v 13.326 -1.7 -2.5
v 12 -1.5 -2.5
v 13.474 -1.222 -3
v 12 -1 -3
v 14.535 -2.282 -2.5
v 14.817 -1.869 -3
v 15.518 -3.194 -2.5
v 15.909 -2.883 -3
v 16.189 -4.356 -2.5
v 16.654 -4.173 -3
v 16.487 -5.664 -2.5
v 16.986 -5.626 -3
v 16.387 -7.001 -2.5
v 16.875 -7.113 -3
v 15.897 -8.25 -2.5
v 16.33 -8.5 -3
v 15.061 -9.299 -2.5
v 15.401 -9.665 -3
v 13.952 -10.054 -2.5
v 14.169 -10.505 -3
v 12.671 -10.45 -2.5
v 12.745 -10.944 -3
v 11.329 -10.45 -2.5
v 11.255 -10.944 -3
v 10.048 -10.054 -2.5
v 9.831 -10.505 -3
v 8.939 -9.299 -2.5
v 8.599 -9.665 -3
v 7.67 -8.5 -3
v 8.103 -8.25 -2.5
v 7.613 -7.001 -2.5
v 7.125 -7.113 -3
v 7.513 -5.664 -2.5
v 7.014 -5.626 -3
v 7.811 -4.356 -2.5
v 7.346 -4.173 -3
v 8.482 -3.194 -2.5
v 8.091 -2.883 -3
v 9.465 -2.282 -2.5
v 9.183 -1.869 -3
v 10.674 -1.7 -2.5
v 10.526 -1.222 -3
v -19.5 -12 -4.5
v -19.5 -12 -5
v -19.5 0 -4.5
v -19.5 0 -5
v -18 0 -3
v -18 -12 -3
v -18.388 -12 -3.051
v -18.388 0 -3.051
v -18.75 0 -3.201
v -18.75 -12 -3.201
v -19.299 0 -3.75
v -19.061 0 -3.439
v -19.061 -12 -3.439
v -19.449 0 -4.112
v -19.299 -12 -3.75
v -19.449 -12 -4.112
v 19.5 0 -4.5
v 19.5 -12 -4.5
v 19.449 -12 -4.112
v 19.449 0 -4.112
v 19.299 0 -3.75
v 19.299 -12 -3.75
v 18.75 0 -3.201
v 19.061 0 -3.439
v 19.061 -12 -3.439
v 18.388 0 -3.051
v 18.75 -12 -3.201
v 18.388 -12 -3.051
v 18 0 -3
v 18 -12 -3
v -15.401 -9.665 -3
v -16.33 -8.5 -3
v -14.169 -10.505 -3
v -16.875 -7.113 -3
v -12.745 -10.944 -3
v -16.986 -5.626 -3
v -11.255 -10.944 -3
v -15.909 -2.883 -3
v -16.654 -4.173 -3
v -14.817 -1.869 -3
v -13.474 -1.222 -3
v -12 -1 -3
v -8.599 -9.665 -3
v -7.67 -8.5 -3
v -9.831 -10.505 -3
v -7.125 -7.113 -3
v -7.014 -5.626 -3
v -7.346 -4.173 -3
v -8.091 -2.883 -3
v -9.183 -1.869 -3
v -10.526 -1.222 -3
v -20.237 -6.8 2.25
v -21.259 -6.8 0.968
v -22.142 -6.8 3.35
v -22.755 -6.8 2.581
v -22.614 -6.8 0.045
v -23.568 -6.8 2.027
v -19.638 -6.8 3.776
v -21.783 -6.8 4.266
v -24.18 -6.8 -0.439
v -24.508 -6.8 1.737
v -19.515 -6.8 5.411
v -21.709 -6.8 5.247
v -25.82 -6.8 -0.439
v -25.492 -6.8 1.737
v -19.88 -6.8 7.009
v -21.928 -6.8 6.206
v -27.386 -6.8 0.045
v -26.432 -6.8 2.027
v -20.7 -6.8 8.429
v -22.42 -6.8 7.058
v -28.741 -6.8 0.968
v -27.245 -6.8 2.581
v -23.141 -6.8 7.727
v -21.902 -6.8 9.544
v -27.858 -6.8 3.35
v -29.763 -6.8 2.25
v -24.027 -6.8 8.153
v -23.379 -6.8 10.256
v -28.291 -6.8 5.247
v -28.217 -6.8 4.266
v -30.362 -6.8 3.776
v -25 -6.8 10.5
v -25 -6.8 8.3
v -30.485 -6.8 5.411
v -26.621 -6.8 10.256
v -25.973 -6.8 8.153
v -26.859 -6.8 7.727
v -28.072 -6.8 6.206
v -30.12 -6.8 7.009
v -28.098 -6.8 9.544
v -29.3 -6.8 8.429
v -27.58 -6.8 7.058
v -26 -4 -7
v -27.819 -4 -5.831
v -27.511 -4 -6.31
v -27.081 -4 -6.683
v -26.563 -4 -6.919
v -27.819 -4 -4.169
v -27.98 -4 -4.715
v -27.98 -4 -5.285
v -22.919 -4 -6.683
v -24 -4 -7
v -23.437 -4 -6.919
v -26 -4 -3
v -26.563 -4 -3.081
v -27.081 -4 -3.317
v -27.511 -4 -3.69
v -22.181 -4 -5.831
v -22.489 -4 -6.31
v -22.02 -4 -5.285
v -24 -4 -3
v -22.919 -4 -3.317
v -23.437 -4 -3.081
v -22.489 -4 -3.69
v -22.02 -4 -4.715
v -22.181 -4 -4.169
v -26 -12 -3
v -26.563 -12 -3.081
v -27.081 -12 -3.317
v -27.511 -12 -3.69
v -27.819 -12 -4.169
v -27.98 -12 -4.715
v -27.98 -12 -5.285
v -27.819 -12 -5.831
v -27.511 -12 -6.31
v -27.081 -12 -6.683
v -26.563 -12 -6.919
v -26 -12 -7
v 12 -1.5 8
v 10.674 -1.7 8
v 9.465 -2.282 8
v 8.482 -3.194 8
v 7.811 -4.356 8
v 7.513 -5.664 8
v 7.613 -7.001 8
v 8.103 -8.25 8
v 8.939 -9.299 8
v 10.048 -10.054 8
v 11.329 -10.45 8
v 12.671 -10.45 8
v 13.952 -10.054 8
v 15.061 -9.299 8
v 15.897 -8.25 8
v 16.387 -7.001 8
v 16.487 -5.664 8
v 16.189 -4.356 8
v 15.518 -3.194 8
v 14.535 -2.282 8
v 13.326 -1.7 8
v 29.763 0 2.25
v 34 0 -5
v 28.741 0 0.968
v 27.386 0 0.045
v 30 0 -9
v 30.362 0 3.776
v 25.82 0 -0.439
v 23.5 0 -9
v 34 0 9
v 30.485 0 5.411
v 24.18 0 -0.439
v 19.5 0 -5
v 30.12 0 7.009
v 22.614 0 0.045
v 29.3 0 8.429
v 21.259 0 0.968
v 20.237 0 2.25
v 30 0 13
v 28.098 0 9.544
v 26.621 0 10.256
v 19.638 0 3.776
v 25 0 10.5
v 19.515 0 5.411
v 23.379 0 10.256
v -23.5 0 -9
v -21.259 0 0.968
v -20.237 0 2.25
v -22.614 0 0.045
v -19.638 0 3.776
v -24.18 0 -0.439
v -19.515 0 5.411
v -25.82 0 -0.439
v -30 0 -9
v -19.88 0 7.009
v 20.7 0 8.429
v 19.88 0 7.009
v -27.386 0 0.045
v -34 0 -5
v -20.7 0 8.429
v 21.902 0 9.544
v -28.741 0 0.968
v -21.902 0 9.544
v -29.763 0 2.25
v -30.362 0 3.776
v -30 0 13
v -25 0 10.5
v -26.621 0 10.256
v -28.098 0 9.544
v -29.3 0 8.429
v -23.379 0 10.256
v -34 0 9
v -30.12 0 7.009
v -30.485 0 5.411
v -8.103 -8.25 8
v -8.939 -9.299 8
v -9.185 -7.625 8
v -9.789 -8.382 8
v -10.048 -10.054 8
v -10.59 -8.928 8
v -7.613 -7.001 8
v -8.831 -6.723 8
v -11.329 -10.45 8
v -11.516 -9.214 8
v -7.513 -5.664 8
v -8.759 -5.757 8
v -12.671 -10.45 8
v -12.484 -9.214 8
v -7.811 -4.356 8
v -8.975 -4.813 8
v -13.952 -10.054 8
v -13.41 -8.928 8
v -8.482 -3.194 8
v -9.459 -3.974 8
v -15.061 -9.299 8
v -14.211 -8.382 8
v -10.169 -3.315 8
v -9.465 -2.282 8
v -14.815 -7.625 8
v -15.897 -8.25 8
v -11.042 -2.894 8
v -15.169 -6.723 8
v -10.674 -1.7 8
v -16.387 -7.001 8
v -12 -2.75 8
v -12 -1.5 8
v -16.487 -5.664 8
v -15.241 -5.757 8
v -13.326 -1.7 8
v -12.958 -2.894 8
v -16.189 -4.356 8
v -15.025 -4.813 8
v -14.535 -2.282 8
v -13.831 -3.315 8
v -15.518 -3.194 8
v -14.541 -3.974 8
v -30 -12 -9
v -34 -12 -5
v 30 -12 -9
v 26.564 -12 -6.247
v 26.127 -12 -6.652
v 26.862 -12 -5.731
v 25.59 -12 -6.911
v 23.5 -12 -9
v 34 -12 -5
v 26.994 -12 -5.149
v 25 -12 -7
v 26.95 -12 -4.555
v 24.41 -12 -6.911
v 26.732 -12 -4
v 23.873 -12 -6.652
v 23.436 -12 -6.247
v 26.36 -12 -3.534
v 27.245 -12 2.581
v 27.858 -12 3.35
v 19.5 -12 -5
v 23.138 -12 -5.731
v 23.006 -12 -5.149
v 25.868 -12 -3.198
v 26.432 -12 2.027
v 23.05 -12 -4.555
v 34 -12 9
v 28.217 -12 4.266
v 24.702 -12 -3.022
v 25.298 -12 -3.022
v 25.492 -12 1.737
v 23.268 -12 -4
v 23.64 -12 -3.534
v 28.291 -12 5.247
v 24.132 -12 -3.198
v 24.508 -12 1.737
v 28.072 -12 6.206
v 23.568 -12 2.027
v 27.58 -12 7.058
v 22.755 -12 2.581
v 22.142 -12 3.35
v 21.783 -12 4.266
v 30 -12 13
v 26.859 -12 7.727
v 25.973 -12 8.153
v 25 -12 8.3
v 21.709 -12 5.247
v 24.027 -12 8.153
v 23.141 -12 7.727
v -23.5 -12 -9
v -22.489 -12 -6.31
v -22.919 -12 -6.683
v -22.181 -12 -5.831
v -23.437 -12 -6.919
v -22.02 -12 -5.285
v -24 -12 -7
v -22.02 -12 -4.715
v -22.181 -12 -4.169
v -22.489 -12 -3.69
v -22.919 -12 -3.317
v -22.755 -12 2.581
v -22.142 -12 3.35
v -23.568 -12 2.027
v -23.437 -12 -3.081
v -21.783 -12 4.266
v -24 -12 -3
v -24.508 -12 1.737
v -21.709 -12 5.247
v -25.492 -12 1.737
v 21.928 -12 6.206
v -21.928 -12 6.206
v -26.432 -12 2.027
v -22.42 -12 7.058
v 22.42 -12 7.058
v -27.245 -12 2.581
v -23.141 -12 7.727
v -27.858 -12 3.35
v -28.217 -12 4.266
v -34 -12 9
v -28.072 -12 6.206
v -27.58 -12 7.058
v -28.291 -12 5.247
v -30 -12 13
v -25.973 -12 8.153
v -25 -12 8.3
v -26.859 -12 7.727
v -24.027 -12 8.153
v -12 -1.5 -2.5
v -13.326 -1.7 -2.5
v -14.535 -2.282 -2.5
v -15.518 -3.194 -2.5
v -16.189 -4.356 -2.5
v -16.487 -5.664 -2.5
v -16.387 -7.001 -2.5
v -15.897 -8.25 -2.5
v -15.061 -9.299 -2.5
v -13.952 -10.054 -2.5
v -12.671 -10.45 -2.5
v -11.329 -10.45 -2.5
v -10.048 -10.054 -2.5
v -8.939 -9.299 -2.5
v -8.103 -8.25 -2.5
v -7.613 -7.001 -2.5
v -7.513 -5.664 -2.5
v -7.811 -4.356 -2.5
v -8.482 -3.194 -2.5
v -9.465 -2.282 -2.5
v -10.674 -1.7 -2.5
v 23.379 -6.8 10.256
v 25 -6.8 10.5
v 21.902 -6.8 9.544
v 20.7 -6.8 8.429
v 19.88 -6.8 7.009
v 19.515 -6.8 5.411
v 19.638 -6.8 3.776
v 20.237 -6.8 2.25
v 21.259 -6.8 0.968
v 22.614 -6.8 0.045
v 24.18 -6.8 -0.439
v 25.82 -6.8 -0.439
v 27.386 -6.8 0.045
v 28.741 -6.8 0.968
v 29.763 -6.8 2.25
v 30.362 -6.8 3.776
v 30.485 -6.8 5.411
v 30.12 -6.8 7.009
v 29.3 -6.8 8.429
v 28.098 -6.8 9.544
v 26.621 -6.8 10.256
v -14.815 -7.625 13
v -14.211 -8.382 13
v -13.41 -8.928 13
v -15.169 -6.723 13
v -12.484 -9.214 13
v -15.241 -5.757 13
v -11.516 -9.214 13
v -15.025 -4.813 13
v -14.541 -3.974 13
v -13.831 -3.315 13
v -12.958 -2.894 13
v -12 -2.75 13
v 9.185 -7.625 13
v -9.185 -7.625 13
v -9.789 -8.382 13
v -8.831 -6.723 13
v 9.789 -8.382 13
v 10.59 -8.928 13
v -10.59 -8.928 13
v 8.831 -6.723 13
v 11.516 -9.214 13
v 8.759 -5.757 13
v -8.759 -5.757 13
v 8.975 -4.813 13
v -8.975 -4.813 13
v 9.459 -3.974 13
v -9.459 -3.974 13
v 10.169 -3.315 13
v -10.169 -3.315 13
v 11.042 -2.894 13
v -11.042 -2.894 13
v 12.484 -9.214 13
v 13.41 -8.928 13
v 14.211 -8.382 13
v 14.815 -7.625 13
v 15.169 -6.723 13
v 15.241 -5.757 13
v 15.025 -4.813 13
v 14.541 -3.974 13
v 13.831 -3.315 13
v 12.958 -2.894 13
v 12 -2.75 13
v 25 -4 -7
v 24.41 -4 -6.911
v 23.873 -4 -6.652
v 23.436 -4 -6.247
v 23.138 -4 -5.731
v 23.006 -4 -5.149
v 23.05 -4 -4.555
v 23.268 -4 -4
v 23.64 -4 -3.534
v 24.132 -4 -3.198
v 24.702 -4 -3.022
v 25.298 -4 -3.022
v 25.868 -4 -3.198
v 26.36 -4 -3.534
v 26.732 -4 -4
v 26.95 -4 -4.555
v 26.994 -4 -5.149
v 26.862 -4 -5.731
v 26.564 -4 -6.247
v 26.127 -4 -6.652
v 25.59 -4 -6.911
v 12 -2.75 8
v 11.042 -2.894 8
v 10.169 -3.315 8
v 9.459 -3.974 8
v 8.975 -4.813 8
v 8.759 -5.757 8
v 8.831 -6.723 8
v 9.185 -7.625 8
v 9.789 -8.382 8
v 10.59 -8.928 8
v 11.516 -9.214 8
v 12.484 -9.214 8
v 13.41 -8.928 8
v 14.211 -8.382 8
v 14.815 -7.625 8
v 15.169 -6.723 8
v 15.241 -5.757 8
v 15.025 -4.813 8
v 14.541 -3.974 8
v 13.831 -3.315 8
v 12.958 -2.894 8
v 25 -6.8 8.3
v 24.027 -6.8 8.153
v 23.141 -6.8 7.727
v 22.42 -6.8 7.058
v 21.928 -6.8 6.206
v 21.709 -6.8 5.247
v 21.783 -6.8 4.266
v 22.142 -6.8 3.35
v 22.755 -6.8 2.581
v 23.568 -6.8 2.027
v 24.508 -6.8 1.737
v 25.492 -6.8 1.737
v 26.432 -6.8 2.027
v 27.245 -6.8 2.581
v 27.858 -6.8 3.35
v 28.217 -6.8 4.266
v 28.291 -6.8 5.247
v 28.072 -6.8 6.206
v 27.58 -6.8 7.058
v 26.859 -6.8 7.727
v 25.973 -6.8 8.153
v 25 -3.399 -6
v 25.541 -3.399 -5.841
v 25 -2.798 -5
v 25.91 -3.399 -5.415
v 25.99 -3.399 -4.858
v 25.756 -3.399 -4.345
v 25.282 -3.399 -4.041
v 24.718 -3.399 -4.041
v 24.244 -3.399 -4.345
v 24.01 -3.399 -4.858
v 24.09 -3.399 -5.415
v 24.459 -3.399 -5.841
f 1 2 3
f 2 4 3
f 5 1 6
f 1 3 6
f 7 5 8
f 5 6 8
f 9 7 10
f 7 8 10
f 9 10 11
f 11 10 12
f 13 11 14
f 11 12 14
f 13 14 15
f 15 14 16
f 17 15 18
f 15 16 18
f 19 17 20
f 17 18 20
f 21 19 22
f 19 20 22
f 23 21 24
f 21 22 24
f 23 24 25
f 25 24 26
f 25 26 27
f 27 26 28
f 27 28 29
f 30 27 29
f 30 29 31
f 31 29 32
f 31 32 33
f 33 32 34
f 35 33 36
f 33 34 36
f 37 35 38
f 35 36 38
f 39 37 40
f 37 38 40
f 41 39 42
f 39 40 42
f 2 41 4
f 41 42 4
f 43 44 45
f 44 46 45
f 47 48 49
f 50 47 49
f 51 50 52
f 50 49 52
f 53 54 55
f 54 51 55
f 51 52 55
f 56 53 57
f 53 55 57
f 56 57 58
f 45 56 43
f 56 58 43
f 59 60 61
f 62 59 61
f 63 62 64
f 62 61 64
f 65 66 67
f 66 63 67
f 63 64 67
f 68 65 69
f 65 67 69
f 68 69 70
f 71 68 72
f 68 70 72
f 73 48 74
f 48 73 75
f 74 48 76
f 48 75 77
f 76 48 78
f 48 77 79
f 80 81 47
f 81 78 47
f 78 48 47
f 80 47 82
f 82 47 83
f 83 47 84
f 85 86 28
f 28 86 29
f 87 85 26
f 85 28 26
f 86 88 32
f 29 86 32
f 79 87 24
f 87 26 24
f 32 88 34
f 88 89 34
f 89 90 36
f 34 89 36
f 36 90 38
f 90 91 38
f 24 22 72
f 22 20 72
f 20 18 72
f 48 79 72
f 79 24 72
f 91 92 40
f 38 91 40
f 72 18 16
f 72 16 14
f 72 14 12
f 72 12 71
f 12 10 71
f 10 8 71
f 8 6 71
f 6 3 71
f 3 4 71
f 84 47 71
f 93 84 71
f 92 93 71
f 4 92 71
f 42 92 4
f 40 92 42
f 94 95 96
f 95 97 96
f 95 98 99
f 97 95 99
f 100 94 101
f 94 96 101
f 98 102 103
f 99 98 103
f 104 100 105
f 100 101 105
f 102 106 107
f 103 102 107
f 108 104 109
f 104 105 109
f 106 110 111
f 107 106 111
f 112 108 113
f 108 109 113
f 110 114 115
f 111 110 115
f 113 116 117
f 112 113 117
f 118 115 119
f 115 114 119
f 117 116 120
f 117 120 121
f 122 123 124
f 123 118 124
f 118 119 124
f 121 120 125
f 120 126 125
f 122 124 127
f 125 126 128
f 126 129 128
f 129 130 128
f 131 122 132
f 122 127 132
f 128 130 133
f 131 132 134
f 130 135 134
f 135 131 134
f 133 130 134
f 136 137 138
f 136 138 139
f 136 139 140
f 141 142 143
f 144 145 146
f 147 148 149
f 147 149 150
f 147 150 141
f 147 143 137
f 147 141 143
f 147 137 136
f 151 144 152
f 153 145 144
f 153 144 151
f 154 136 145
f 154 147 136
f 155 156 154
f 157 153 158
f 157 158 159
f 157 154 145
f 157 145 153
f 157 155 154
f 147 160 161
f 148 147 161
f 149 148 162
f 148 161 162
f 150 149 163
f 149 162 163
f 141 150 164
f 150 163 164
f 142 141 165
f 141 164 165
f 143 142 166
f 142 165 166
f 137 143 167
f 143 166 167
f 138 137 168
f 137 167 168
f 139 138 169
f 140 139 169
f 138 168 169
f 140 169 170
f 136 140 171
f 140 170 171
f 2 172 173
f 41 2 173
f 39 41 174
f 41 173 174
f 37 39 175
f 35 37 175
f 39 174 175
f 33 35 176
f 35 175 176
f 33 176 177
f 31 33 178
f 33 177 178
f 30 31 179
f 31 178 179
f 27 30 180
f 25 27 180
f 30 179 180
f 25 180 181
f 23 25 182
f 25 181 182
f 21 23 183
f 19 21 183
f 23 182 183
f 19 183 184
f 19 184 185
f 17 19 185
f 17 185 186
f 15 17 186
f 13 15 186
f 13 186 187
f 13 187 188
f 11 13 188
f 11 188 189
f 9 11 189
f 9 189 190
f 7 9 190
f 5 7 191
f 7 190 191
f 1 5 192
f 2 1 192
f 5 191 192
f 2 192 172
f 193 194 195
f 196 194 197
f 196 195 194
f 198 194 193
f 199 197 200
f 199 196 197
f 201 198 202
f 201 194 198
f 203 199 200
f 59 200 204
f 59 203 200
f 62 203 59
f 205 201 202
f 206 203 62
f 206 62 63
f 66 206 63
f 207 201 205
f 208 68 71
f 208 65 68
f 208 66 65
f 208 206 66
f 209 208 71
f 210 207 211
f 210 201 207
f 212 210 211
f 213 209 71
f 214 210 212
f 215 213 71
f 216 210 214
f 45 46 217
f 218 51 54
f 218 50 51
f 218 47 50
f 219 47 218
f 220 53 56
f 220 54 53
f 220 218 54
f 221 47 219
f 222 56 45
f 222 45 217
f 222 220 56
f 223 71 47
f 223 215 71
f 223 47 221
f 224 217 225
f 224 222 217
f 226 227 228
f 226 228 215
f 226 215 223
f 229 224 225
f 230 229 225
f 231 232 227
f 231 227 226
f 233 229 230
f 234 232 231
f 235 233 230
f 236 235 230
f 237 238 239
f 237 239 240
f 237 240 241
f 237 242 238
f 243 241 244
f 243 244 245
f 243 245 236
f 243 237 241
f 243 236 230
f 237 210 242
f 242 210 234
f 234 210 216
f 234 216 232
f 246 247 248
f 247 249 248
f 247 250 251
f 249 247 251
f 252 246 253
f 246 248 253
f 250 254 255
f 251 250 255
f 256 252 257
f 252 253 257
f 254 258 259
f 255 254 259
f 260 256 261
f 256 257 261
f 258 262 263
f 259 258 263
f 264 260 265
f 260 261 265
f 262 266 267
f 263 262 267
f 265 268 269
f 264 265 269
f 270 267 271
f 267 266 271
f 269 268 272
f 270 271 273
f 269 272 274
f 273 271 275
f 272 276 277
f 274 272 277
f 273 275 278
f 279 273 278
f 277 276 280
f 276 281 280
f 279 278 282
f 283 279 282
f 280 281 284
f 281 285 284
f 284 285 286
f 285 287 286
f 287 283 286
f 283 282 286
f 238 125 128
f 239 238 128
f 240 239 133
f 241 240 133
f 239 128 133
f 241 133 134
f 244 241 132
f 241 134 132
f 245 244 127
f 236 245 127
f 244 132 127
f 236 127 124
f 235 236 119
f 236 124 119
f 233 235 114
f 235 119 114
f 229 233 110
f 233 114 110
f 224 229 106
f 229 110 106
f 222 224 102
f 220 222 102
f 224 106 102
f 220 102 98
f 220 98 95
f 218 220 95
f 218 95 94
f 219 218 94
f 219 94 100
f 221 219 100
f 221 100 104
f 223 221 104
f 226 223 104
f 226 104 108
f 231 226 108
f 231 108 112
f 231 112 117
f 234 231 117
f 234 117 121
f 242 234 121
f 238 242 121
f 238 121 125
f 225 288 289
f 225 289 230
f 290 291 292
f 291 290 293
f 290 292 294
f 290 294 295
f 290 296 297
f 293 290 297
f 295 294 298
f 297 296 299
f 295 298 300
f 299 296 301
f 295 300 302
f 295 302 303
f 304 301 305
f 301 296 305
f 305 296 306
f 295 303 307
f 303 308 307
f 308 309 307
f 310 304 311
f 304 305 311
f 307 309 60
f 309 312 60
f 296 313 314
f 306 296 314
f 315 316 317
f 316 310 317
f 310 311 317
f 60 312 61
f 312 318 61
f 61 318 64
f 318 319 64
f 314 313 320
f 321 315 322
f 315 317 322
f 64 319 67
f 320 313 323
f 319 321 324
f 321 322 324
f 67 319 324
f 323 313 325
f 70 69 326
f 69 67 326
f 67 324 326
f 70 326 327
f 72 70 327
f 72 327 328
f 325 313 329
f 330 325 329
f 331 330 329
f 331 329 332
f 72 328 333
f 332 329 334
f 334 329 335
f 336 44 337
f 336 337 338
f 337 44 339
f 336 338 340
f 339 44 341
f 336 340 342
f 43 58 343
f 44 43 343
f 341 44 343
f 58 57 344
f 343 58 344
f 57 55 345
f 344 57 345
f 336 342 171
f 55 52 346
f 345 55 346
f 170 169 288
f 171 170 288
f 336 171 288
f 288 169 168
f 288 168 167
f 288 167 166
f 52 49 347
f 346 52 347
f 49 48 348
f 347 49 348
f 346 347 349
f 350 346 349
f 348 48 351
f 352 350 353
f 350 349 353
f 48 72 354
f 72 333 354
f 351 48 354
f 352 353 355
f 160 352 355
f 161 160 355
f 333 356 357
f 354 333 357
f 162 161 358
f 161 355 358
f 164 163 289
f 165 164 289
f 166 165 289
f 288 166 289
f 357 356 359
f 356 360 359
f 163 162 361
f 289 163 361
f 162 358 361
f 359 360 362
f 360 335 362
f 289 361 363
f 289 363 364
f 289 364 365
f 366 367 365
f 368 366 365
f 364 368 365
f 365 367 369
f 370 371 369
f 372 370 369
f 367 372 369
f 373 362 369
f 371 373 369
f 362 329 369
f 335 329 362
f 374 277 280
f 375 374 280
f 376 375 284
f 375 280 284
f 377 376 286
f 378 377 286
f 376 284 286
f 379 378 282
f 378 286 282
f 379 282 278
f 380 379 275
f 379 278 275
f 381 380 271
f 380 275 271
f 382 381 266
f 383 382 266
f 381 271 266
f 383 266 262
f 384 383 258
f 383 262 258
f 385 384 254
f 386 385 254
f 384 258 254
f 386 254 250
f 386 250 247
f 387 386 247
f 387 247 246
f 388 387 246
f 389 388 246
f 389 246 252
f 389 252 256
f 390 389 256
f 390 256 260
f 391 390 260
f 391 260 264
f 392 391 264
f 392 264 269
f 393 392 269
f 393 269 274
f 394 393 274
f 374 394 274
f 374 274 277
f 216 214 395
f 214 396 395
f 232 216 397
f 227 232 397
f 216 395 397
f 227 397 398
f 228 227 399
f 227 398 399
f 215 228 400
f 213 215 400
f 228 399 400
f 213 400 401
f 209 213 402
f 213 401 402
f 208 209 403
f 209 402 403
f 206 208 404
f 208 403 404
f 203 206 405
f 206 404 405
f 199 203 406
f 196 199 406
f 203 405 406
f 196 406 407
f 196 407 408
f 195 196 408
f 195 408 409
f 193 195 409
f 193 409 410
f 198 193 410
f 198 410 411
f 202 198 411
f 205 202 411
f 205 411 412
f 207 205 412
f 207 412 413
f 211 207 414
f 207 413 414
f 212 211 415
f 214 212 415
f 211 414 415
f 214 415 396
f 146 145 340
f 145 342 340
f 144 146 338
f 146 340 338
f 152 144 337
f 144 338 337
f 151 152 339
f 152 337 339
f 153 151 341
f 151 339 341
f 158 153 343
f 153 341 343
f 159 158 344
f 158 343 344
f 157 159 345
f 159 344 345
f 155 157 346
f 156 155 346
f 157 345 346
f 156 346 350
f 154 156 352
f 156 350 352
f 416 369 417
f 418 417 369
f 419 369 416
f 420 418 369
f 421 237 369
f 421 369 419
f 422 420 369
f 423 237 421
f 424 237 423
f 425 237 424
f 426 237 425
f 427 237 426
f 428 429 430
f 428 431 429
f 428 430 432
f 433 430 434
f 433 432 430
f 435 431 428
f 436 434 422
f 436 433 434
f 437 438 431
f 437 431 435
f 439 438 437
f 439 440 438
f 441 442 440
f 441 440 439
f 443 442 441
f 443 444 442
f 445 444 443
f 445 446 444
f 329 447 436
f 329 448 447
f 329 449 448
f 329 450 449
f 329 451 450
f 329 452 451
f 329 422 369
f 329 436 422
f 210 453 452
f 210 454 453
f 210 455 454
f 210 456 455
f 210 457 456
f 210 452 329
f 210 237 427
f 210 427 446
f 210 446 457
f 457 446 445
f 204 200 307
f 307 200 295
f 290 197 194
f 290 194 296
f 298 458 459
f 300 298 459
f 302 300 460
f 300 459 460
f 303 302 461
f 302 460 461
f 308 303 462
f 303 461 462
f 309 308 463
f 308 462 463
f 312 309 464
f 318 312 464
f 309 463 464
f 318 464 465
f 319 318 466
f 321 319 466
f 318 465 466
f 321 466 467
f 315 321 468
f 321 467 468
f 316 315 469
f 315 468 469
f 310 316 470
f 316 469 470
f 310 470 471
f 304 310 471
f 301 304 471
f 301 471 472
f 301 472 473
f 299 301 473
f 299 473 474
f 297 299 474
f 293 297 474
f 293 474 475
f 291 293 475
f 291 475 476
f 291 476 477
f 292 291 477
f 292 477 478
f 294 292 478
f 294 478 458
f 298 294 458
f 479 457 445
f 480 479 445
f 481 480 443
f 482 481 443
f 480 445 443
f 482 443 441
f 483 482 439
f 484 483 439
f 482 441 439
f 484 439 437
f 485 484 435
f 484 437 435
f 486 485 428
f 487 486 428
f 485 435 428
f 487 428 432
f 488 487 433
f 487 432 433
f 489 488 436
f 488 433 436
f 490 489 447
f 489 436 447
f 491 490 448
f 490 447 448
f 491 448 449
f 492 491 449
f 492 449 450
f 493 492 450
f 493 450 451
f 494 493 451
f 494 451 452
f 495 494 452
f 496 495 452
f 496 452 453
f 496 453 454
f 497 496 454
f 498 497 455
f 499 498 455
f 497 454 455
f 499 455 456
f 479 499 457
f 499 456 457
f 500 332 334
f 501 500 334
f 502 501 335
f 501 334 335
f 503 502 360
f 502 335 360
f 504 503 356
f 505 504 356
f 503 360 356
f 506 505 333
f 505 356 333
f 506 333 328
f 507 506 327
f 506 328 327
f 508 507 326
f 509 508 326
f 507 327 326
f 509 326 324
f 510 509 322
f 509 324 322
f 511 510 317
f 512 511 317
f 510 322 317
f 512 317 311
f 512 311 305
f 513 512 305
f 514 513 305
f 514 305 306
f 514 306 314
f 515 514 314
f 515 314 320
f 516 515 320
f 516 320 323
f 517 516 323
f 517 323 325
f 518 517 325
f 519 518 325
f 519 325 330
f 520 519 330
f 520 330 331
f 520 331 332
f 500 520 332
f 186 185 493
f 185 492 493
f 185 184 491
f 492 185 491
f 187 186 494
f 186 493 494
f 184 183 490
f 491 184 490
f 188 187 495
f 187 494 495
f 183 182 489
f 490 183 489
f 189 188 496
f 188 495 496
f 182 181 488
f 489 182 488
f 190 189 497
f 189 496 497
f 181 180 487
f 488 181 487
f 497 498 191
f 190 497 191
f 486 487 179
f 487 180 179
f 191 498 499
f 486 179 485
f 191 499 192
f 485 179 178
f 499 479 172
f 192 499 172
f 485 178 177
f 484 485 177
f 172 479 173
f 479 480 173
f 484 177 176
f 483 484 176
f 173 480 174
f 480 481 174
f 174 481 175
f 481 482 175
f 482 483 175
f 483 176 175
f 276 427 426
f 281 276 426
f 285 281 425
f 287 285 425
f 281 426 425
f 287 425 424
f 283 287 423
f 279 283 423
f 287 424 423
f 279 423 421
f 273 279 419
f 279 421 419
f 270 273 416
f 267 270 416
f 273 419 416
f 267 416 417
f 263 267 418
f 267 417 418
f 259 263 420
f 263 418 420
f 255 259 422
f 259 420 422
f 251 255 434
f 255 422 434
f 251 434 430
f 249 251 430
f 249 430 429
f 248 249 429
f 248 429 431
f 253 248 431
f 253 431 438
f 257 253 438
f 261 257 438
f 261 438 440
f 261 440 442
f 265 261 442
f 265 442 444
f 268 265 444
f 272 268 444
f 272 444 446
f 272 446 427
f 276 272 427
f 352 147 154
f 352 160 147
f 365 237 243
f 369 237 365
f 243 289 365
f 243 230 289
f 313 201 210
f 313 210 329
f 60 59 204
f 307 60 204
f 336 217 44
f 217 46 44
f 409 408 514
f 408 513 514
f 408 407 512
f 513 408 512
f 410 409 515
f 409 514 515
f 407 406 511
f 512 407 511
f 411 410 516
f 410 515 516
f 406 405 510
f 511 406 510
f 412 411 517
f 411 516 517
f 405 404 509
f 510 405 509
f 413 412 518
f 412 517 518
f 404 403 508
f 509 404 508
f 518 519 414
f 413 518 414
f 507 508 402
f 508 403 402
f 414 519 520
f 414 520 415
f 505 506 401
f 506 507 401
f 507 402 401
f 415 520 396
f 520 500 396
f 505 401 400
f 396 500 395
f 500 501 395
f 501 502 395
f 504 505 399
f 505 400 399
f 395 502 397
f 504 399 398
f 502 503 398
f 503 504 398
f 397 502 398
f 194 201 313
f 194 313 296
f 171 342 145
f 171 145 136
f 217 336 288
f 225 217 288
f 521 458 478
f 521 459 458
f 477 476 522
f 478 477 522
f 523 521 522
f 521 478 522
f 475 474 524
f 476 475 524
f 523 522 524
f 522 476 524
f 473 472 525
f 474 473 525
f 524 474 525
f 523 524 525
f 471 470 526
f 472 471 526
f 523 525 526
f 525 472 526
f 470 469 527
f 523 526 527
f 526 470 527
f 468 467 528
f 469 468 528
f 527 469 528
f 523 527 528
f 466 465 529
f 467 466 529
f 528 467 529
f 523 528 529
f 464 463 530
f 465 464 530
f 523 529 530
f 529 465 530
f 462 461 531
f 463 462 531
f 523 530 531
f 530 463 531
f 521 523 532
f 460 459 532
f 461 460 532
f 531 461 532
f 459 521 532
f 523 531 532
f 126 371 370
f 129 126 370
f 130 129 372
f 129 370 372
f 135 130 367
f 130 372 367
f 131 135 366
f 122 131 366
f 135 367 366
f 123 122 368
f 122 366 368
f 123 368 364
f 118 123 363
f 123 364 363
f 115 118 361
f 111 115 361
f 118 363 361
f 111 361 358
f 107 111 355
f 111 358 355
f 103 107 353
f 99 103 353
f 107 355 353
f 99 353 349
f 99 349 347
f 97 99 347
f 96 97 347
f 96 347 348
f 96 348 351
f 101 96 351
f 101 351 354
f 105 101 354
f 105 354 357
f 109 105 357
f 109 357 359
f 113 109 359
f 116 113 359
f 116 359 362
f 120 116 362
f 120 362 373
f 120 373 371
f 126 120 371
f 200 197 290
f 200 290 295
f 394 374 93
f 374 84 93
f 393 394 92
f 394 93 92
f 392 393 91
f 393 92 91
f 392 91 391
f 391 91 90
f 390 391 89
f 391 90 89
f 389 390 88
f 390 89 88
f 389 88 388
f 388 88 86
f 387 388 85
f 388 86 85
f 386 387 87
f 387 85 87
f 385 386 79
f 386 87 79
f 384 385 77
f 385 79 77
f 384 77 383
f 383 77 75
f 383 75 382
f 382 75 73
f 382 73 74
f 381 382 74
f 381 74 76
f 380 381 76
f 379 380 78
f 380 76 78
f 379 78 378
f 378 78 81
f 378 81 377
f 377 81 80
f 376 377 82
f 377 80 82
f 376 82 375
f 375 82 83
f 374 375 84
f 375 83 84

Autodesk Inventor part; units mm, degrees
ref_plane "YZ Plane" through (0, 0, 0) normal (1, 0, 0) x (0, 1, 0)
ref_plane "XZ Plane" through (0, 0, 0) normal (0, 1, 0) x (-1, 0, 0)
ref_plane "XY Plane" through (0, 0, 0) normal (0, 0, 1) x (1, 0, 0)
sketch "Sketch1" plane through (0, 0, 0) normal (0, 1, 0) x (-1, 0, 0)
  line L0 (40.6019, 0) -> (-40.6019, 0) construction
  line L1 (0, 14.7427) -> (0, -14.7427) construction
  line L2 (25, 5) -> (-25, 5) construction
  line L3 (-25, 5) -> (-25, -5) construction
  line L4 (-25, -5) -> (25, -5) construction
  line L5 (25, -5) -> (25, 5) construction
  line L6 (34, 13) -> (-34, 13)
  line L7 (-34, 13) -> (-34, -9)
  line L8 (-34, -9) -> (34, -9)
  line L9 (34, -9) -> (34, 13)
  line L10 (26, -5) -> (24, -5) construction
  line L11 (26, -3) -> (24, -3)
  line L12 (24, -7) -> (26, -7)
  arc A0 (26, -7) -> (26, -3) centre (26, -5) ccw
  arc A1 (24, -3) -> (24, -7) centre (24, -5) ccw
  point P0 (0, 0)
  point P1 (0, 0)
  point P2 (-25, 5)
  dimension "d2" = 50
  dimension "d3" = 10
  dimension "d4" = 68
  dimension "d5" = 22
  dimension "d16" = 8
  dimension "d17" = 1
  dimension "d18" = 4
extrude "Extrusion1" add sketch "Sketch1" against normal blind 12 contours L9 L8 L7 L6 | A0 L12 A1 L11
sketch "Sketch6" plane through (0, -12, 0) normal (0, -1, 0) x (1, 0, 0)
  line L0 (-26, -3) -> (-24, -3) projected
  arc A0 (-26, -3) -> (-26, -7) centre (-26, -5) ccw projected
  line L1 (-24, -7) -> (-26, -7) projected
  arc A1 (-24, -7) -> (-24, -3) centre (-24, -5) ccw projected
  point P0 (0, 0)
  point P1 (25, -5)
hole "Hole5" at (25, -12, -5) direction (0, 1, 0) diameter 4 depth 8 tip angle 118
extrude "Extrusion4" cut sketch "Sketch6" against normal blind 8
hole "Hole1" at (-25, 0, 5) at (25, 0, 5) direction (0, -1, 0) diameter 6.6 end through all counterbore diameter 11 counterbore depth 6.8 clearance for "Socket Head Cap Screw ISO 4762" size "M6" standard "ISO"
sketch "Sketch3" plane through (0, 0, 0) normal (0, 1, 0) x (1, 0, 0)
  line L0 (19.5, 9) -> (-19.5, 9)
  line L1 (-19.5, 9) -> (-19.5, 3)
  line L2 (-19.5, 3) -> (19.5, 3)
  line L3 (19.5, 3) -> (19.5, 9)
  line L4 (34, 9) -> (-34, 9) projected
  line L5 (0, 0) -> (0, 9) construction
  dimension "d34" = 39
  dimension "d35" = 6
extrude "Extrusion2" cut sketch "Sketch3" against normal through all
chamfer "Chamfer2" distance 4 angle 45 6 edges at (34, -6, -9) (34, -6, 13) (-34, -6, 13) (-34, -6, -9) (19.5, -6, -9) (-19.5, -6, -9)
fillet "Fillet2" radius 1.5 2 edges at (-19.5, -6, -3) (19.5, -6, -3)
sketch "Sketch7" plane through (18, 0, -3) normal (0, 0, -1) x (-1, 0, 0)
  line L0 (18, 0) -> (18, -12)
  line L1 (-12, -12) -> (48, -12) projected
  line L2 (30, -6) -> (6, -6)
  point P0 (18, -6)
  dimension "d67" = 24
hole "Hole6" at (-12, -6, -3) at (12, -6, -3) direction (0, 0, 1) diameter 6.5 end through all counterbore diameter 9 counterbore depth 11
chamfer "Chamfer3" distance 0.5 angle 45 2 edges at (12, -10.5, -3) (-12, -10.5, -3)
equation "\"d67\" = shaftSeparation"
equation "\"shaftSeparation\" = 24"
properties part number "FAB-OX002x-PiezoPusherBaseComponent" material "Aluminum 6061"
